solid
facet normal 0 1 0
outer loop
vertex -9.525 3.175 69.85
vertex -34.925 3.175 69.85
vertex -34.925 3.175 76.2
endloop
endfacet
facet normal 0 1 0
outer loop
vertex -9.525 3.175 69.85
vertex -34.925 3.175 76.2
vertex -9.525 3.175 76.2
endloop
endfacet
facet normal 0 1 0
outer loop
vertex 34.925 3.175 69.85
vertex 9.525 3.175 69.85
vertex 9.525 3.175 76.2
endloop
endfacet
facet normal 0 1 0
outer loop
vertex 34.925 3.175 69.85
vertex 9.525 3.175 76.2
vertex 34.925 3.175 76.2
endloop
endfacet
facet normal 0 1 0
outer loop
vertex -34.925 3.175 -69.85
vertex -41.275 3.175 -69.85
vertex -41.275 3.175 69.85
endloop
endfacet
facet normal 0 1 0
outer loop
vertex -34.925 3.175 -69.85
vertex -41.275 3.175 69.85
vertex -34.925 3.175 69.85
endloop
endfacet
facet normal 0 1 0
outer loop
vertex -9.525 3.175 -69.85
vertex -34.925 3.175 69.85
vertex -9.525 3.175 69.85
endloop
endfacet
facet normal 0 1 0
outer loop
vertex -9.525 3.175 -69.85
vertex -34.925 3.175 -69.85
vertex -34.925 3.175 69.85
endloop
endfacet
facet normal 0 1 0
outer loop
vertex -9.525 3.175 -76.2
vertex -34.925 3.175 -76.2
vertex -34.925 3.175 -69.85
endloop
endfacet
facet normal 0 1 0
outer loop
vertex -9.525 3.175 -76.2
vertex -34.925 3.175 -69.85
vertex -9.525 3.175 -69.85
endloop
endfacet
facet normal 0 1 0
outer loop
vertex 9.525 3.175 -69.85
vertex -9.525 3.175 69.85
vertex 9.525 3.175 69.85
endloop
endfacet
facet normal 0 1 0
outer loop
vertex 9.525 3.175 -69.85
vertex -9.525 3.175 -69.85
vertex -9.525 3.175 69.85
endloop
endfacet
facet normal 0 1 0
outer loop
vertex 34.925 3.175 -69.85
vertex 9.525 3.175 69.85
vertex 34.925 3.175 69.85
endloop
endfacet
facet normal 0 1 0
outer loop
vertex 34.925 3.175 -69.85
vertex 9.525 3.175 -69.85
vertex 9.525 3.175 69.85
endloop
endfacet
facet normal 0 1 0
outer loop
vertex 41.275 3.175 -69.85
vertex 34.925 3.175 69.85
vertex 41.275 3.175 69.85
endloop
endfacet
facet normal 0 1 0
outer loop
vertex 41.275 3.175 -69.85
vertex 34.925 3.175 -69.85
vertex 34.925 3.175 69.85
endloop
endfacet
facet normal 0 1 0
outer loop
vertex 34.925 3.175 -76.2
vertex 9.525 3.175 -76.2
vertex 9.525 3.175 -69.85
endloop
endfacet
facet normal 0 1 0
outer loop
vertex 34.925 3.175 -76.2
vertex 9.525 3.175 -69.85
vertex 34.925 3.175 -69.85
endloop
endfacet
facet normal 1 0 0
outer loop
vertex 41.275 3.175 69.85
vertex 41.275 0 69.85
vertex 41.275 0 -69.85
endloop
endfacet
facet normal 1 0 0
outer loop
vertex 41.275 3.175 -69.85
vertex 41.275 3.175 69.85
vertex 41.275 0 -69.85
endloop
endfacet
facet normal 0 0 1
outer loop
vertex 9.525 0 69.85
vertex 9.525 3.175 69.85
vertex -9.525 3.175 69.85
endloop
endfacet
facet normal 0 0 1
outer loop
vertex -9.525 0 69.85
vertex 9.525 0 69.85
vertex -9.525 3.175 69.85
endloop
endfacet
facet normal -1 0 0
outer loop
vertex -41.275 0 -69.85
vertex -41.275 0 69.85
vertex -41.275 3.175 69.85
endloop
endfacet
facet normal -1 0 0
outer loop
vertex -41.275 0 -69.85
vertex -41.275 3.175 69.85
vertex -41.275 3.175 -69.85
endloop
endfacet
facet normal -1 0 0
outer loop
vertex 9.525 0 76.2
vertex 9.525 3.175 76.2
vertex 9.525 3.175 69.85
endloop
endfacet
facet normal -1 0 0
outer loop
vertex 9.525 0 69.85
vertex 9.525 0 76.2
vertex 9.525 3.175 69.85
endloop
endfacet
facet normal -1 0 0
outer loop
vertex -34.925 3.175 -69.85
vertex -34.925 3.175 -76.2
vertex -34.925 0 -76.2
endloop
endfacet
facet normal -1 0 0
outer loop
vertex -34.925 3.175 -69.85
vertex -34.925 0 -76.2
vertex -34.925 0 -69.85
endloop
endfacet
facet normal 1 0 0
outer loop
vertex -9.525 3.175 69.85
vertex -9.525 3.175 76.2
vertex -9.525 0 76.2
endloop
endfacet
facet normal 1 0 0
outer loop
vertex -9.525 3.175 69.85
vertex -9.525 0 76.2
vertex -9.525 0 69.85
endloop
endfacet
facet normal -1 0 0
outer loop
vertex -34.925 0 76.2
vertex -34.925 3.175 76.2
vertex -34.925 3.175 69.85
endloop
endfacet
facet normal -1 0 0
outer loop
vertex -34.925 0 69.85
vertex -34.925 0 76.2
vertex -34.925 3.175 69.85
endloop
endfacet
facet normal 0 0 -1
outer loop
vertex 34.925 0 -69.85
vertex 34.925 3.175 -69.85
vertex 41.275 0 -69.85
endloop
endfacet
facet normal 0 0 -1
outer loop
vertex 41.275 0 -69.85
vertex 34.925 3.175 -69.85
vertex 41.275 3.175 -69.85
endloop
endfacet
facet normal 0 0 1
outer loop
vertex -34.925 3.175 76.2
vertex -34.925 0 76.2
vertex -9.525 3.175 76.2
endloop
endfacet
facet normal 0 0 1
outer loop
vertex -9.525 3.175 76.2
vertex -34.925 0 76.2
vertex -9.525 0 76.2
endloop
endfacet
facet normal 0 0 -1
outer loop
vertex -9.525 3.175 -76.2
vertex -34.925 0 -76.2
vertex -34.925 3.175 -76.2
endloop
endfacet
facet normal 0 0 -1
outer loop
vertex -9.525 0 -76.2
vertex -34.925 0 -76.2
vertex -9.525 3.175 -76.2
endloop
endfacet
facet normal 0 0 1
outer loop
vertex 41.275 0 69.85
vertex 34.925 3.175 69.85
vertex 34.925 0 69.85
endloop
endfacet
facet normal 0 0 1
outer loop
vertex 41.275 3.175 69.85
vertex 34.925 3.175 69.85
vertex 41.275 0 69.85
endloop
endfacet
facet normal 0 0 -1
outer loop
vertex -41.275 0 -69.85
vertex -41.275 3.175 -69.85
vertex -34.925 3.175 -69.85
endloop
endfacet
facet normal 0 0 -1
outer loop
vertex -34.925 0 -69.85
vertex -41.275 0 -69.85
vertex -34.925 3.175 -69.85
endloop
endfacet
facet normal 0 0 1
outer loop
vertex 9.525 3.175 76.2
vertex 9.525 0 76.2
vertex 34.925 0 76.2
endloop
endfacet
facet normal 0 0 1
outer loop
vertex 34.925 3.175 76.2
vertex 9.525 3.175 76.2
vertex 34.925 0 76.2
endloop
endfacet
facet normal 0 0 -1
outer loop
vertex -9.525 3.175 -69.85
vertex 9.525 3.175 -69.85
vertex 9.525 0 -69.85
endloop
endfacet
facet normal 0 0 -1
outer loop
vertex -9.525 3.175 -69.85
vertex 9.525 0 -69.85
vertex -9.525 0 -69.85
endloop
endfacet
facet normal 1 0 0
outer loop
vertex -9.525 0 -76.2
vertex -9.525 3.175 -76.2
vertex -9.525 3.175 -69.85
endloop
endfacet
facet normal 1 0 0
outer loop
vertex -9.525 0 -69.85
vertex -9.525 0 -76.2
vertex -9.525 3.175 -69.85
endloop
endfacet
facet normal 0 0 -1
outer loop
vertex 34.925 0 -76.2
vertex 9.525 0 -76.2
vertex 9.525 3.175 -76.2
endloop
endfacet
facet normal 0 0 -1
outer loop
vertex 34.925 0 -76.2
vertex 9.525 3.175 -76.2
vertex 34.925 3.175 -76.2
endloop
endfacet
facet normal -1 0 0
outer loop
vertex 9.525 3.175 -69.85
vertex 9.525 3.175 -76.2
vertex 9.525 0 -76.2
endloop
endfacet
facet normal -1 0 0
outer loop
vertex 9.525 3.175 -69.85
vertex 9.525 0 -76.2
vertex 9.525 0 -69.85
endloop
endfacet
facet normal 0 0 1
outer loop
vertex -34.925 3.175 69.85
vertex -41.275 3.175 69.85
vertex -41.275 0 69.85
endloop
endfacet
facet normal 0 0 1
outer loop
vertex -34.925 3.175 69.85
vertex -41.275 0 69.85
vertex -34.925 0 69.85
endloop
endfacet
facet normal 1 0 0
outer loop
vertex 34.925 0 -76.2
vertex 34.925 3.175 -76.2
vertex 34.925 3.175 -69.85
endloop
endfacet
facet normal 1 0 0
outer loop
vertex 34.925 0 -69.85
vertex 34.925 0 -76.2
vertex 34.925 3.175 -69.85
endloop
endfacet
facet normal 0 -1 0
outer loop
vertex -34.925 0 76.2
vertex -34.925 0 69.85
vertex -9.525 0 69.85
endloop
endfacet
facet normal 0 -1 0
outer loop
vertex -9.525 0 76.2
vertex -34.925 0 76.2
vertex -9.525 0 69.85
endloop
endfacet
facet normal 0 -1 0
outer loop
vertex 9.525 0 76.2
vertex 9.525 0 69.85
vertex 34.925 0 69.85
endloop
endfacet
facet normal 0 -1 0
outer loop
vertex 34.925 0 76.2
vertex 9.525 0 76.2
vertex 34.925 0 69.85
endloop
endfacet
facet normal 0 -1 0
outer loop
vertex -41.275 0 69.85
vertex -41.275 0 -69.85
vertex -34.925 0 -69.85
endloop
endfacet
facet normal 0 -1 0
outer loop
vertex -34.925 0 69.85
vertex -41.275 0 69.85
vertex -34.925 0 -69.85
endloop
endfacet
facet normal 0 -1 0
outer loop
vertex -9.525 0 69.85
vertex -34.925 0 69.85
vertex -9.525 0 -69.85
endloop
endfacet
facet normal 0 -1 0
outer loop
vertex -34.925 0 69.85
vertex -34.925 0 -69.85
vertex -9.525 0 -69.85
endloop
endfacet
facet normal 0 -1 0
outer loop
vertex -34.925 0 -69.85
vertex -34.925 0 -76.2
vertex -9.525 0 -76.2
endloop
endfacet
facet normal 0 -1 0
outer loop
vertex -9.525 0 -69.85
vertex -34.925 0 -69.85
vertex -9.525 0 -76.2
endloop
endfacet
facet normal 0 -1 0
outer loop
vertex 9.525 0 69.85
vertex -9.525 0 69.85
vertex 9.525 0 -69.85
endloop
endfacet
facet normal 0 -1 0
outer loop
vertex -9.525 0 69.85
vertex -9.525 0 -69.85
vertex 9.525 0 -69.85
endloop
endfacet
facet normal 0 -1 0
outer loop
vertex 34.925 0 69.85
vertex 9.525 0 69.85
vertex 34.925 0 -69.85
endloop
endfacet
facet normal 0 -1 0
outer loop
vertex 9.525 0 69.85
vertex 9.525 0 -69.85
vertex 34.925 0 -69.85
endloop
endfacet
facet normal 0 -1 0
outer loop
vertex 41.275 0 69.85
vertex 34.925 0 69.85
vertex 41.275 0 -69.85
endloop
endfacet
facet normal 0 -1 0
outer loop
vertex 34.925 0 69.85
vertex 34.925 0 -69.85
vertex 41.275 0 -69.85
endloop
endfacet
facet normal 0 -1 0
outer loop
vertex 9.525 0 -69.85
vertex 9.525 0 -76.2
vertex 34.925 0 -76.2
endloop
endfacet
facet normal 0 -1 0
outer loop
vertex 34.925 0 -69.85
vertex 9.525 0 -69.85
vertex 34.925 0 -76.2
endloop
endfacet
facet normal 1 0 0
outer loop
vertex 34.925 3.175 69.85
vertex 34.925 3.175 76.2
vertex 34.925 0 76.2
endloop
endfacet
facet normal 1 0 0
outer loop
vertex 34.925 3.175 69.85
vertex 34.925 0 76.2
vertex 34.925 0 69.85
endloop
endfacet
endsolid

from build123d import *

# Parameters (mm, degrees)
SKETCH1_W           = 82.55
SKETCH1_H           = 152.4
BOSS_EXTRUDE1_DEPTH = 3.175
SKETCH2_W           = 6.35
SKETCH2_H           = 6.35
SKETCH2_W_2         = 9.525
CUT_EXTRUDE1_DEPTH  = 4.175


with BuildPart() as part:
    # Sketch1 → Boss-Extrude1 (new body)
    with BuildSketch(Plane(origin=(0, 0, 0), x_dir=(1, 0, 0), z_dir=(0, 1, 0))):
        Rectangle(SKETCH1_W, SKETCH1_H)
    extrude(amount=BOSS_EXTRUDE1_DEPTH)

    # Sketch2 → Cut-Extrude1 (cut, through all)
    with BuildSketch(Plane(origin=(0, 3.175, 0), x_dir=(1, 0, 0), z_dir=(0, 1, 0))):
        with Locations((-38.1, -73.025)):
            Rectangle(SKETCH2_W, SKETCH2_H)
        with Locations((-4.7625, -73.025)):
            Rectangle(SKETCH2_W_2, SKETCH2_H)
        with Locations((4.7625, -73.025)):
            Rectangle(SKETCH2_W_2, SKETCH2_H)
        with Locations((38.1, -73.025)):
            Rectangle(SKETCH2_W, SKETCH2_H)
    cut_extrude1 = extrude(amount=-CUT_EXTRUDE1_DEPTH, mode=Mode.SUBTRACT)

    # Mirror1: Cut-Extrude1 across plane
    add(cut_extrude1.mirror(Plane.XY), mode=Mode.SUBTRACT)


solid = part.part
